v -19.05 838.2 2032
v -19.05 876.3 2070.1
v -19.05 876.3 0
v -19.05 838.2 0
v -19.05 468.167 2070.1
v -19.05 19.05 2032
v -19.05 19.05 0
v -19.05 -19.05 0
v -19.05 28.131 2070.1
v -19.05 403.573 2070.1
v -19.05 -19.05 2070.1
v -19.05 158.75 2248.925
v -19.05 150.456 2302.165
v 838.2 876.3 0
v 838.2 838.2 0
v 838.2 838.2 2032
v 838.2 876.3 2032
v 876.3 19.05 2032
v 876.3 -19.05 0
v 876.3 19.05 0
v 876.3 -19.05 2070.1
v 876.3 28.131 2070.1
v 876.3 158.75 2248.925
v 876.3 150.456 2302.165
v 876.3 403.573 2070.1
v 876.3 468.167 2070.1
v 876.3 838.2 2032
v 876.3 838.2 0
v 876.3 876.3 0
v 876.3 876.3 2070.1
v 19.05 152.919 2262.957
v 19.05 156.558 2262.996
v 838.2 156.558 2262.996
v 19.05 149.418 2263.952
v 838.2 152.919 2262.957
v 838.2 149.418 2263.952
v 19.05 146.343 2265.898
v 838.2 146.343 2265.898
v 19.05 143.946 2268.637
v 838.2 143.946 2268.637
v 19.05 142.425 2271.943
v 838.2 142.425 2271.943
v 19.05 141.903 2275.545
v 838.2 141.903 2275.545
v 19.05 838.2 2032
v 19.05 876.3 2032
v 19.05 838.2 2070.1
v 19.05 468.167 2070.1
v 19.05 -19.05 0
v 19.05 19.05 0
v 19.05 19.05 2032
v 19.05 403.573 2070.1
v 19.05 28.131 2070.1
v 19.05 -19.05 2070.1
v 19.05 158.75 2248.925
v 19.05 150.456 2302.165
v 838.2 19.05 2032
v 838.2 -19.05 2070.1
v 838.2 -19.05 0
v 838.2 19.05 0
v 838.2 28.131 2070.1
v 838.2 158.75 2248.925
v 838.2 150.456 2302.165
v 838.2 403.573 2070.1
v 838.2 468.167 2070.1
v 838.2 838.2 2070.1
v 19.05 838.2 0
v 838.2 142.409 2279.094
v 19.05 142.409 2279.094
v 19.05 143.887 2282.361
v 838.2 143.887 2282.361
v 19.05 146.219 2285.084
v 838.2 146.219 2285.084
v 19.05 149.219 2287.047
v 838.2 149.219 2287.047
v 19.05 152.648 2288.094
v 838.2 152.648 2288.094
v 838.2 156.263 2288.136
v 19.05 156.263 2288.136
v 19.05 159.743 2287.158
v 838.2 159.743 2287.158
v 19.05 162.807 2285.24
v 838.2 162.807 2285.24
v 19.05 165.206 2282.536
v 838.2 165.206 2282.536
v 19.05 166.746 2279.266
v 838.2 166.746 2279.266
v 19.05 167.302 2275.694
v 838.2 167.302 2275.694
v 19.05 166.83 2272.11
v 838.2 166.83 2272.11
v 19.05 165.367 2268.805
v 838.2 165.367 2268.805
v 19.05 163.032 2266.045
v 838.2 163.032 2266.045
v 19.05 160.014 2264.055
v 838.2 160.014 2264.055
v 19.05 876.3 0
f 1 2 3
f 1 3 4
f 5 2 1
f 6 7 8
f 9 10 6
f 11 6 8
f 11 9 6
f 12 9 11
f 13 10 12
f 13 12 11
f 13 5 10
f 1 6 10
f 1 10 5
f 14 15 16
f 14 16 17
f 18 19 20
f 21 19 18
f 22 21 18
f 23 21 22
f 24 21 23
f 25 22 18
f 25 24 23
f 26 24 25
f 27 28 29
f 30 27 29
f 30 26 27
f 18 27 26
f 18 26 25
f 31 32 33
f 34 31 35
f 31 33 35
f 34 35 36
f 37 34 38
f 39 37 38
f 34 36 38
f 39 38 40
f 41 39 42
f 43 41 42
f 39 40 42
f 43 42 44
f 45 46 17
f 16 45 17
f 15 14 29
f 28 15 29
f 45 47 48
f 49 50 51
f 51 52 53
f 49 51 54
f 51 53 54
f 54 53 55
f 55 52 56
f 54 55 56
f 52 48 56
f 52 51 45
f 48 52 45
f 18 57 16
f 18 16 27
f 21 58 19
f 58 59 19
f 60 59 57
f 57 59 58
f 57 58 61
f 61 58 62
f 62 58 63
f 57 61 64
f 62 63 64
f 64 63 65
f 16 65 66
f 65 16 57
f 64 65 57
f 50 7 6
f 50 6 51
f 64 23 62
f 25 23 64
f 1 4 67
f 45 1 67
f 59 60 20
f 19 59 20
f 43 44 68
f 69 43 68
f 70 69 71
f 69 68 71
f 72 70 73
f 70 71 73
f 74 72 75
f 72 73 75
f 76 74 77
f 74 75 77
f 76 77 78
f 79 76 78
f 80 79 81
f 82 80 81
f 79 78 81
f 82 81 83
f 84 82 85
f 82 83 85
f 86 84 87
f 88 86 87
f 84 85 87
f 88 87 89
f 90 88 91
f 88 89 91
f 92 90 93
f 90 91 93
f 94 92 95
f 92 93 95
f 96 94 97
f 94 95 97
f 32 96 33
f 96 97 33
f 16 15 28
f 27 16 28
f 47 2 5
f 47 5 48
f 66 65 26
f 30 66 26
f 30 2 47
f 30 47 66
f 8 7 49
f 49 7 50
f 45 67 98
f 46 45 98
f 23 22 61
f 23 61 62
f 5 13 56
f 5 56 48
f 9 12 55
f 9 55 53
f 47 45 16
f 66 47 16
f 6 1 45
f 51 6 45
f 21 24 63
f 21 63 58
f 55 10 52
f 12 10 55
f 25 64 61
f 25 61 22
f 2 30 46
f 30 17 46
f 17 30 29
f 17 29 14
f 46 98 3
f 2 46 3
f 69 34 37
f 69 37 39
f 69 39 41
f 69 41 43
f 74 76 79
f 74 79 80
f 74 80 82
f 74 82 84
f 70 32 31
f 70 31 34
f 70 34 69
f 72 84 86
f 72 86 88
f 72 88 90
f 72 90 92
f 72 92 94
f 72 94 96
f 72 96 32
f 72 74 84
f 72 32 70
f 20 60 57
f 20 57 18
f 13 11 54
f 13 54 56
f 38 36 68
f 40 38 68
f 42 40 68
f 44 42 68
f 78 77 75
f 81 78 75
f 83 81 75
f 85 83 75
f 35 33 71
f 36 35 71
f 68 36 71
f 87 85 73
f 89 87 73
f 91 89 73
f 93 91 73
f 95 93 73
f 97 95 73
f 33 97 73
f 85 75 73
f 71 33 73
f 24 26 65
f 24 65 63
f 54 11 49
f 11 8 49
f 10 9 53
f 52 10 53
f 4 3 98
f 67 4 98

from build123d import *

# Parameters (mm, degrees)
F0_W     = 38.1
F0_H     = 38.1
F1_DEPTH = 2032
F2_W     = 38.1
F2_H     = 38.1
F3_DEPTH = 38.1
F5_DEPTH = 38.1
F7_DEPTH = 38.1
F9_DEPTH = 819.15


with BuildPart() as f1:
    # F0 (on Top) → F1 (new body)
    with BuildSketch(Plane.XY):
        with Locations((0, 857.25)):
            Rectangle(F0_W, F0_H)
        with Locations((857.25, 857.25)):
            Rectangle(F0_W, F0_H)
        Rectangle(F0_W, F0_H)
        with Locations((857.25, 0)):
            Rectangle(F0_W, F0_H)
    extrude(amount=F1_DEPTH)

    # F2 (on face) → F3 (join)
    with BuildSketch(Plane.XY.offset(2032)):
        Polygon((-19.05, 876.3), (-19.05, 19.05), (19.05, 19.05), (19.05, 838.2), (838.2, 838.2), (838.2, -19.05), (876.3, -19.05), (876.3, 876.3), align=None)
        Rectangle(F2_W, F2_H)
    extrude(amount=F3_DEPTH)

    # F4 (on face) → F5 (join)
    with BuildSketch(Plane(origin=(-19.05, 0, 0), x_dir=(0, -1, 0), z_dir=(-1, 0, 0))):
        Polygon((-28.131318, 2070.1), (19.05, 2070.1), (-150.456127, 2302.164652), (-468.167371, 2070.1), (-403.573152, 2070.1), (-158.75, 2248.925271), align=None)
    extrude(amount=-F5_DEPTH)

    # F6 (on face) → F7 (join, through all)
    with BuildSketch(Plane.YZ.offset(876.3)):
        Polygon((468.167371, 2070.1), (150.456127, 2302.164652), (-19.05, 2070.1), (28.131318, 2070.1), (158.75, 2248.925271), (403.573152, 2070.1), align=None)
    extrude(amount=-F7_DEPTH)


with BuildPart() as f9:
    # F8 (on face) → F9 (new body, through all)
    with BuildSketch(Plane(origin=(838.2, 0, 0), x_dir=(0, -1, 0), z_dir=(-1, 0, 0))):
        with BuildLine():
            ThreePointArc((-156.557948, 2262.996319), (-146.342828, 2265.898277), (-141.903063, 2275.544961))
            ThreePointArc((-141.903063, 2275.544961), (-144.956379, 2283.805196), (-152.648179, 2288.093604))
            Line((-152.648179, 2288.093604), (-156.557948, 2262.996319))
        make_face()
        with BuildLine():
            Line((-156.557948, 2262.996319), (-152.648179, 2288.093604))
            ThreePointArc((-152.648179, 2288.093604), (-167.151706, 2277.499846), (-156.557948, 2262.996319))
        make_face()
    extrude(amount=F9_DEPTH)


solid = Compound([f1.part, f9.part])
